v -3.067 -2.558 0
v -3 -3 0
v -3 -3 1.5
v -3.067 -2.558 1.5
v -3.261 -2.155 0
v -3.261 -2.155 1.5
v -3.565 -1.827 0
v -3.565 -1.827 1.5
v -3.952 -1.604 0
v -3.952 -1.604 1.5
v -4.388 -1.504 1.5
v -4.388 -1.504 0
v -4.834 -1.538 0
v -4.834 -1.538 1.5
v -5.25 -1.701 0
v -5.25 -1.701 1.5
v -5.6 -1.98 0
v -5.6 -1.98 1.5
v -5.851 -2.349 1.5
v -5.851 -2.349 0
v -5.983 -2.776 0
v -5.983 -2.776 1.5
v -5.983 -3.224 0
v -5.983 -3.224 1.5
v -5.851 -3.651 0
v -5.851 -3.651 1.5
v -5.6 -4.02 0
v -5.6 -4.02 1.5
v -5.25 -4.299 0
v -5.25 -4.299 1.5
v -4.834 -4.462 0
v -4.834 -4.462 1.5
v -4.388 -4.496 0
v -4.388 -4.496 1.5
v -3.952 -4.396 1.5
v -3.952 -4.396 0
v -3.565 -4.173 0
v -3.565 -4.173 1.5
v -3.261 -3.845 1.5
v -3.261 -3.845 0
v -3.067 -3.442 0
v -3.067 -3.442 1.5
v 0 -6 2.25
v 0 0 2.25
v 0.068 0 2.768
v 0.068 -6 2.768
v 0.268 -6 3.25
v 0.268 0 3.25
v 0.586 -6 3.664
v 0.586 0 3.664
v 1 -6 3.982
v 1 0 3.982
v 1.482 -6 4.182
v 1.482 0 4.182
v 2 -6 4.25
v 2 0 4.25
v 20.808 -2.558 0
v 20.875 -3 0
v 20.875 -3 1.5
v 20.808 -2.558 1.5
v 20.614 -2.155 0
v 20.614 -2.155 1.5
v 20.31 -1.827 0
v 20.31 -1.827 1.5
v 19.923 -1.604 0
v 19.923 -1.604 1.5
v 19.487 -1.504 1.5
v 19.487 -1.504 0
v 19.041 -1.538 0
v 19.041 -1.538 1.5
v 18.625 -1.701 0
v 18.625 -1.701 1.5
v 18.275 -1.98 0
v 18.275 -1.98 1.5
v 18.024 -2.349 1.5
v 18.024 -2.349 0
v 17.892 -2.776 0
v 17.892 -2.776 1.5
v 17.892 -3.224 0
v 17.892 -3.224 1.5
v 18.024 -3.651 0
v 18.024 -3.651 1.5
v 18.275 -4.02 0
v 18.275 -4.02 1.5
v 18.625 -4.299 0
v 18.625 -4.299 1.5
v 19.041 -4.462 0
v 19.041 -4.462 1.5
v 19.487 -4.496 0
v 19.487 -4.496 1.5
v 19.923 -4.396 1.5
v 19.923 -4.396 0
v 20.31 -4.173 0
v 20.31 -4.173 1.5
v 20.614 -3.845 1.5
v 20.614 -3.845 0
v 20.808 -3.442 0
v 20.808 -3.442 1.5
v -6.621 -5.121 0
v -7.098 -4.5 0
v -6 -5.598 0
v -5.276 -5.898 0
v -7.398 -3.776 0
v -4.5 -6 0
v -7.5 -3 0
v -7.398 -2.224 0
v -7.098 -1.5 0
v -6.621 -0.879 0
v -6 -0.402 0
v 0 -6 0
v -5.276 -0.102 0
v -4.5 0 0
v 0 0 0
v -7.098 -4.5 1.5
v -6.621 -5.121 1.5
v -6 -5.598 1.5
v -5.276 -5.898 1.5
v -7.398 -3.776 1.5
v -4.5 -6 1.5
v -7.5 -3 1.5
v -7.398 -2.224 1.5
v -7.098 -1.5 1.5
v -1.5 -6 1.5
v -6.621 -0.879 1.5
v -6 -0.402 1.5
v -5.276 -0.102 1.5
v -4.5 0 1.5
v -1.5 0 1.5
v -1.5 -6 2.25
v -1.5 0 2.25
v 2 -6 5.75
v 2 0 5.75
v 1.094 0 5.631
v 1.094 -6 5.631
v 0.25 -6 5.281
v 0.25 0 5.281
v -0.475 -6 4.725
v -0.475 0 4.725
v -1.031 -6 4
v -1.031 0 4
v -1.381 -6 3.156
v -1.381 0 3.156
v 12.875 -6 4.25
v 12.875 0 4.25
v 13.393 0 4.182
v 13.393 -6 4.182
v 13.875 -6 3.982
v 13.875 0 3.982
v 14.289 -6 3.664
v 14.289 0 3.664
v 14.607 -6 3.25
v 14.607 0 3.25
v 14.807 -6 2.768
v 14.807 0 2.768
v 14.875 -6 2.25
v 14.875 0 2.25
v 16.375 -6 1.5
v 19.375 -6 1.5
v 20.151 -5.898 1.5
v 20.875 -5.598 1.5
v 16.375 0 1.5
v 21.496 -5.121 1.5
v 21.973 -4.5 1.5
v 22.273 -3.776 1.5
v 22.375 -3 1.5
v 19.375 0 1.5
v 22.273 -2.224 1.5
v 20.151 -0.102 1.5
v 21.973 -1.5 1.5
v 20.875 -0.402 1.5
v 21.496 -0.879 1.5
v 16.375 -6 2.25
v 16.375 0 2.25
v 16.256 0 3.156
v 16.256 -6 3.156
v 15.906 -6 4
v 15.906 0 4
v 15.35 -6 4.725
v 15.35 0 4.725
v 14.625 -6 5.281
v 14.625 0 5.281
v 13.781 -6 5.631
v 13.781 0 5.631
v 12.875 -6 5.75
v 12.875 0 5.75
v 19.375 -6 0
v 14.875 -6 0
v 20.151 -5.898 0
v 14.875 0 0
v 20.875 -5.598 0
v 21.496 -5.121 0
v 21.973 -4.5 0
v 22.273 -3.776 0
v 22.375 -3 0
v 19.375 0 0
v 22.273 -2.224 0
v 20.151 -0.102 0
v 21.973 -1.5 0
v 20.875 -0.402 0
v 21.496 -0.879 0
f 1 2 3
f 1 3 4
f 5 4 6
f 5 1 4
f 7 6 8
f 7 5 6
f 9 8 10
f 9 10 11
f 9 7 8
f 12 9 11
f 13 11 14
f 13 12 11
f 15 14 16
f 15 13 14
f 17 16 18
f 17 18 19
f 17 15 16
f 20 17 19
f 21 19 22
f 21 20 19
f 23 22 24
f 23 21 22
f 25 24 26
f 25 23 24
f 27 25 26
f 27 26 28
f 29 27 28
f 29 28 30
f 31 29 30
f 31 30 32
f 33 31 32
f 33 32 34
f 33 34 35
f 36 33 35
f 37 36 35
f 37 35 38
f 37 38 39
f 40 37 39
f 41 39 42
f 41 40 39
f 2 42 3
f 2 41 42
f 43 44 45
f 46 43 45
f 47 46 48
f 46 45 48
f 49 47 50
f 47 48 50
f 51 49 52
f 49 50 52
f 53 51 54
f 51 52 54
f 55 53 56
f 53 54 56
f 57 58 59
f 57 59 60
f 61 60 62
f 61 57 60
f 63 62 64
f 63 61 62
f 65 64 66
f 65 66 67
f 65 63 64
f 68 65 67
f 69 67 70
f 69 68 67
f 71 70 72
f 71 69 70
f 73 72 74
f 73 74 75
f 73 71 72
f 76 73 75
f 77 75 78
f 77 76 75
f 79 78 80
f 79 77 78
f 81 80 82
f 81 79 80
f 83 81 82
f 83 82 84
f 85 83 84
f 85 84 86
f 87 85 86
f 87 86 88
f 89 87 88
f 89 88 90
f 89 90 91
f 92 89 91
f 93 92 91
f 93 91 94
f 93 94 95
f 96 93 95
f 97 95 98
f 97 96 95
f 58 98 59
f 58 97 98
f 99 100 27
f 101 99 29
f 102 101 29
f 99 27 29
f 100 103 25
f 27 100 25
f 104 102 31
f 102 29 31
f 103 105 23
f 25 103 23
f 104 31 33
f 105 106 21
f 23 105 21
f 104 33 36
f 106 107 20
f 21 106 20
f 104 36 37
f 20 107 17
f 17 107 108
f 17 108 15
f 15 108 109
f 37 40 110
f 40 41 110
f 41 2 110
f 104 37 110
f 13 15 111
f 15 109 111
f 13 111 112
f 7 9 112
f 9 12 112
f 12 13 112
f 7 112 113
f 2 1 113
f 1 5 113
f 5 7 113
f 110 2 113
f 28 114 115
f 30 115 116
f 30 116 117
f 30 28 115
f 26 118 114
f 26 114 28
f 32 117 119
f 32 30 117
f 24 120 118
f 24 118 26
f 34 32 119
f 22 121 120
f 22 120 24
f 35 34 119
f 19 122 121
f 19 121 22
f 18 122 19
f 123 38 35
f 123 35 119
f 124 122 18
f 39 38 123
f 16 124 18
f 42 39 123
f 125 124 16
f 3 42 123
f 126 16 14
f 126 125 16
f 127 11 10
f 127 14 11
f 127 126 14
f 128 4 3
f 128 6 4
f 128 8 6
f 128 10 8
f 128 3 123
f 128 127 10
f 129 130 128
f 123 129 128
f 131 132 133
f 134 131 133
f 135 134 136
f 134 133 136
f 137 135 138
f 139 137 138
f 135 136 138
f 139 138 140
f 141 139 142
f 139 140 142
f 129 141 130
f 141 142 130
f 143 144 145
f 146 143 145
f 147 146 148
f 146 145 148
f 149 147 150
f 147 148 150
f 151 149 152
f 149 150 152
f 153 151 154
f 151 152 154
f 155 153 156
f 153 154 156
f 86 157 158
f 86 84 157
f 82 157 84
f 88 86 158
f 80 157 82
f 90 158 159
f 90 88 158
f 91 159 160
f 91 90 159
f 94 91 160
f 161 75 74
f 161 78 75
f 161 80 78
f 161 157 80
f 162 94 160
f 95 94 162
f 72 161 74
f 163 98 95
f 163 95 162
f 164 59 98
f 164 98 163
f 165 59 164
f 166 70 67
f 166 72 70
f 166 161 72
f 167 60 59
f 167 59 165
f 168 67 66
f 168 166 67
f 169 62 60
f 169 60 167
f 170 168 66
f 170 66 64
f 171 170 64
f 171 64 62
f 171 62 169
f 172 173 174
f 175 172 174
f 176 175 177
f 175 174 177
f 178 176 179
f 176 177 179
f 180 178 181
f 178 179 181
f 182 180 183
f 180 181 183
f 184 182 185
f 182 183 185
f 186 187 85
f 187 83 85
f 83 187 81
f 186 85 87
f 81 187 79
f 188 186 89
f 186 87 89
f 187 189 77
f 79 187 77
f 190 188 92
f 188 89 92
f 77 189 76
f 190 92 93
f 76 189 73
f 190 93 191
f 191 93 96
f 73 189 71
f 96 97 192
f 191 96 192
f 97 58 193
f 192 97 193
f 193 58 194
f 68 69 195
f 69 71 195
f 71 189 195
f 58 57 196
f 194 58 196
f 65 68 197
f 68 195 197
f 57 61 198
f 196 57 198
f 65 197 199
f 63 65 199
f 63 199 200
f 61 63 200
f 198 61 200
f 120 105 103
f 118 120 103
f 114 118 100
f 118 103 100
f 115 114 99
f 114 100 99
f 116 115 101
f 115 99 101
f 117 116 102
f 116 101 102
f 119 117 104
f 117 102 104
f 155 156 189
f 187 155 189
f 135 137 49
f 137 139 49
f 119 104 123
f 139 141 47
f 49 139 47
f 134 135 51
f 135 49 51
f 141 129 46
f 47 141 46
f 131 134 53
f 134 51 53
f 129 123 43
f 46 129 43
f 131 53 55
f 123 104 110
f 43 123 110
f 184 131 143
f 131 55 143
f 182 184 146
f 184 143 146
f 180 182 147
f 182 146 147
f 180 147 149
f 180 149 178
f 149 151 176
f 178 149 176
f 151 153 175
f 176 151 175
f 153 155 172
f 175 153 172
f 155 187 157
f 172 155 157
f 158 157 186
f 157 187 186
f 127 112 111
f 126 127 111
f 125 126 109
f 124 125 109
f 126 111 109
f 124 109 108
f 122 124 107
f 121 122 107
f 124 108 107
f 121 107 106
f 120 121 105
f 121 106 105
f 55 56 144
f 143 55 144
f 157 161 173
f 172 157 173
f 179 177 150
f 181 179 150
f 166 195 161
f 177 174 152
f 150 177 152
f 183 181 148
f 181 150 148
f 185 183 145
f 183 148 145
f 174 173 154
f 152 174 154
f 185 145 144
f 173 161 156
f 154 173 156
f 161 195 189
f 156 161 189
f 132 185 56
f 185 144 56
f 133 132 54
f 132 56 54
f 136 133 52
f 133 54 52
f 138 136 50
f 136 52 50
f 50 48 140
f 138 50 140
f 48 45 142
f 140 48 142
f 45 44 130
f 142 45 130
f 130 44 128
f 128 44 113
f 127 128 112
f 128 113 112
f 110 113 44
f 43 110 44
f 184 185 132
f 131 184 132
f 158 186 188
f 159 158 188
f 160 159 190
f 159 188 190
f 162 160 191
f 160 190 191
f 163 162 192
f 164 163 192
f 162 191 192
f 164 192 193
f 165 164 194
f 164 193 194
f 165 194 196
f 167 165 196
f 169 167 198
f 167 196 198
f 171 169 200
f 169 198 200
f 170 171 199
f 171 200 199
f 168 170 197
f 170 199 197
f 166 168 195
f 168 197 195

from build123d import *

# Parameters (mm, degrees)
F1_DEPTH = 6
F2_R     = 1.5
F3_DEPTH = 1.5


with BuildPart() as f1:
    # F0 (on Front) → F1 (new body)
    with BuildSketch(Plane.XZ):
        with BuildLine():
            Line((-1.5, 0), (0, 0))
            Line((0, 0), (0, 2.25))
            ThreePointArc((0, 2.25), (0.585786, 3.664214), (2, 4.25))
            Line((2, 4.25), (12.875, 4.25))
            ThreePointArc((12.875, 4.25), (14.289214, 3.664214), (14.875, 2.25))
            Line((14.875, 2.25), (14.875, 0))
            Line((14.875, 0), (16.375, 0))
            Line((16.375, 0), (16.375, 2.25))
            ThreePointArc((16.375, 2.25), (15.349874, 4.724874), (12.875, 5.75))
            Line((12.875, 5.75), (2, 5.75))
            ThreePointArc((2, 5.75), (-0.474874, 4.724874), (-1.5, 2.25))
            Line((-1.5, 2.25), (-1.5, 0))
        make_face()
    extrude(amount=F1_DEPTH)

    # F2 (on Top) → F3 (join)
    with BuildSketch(Plane.XY):
        with BuildLine():
            Line((-1.5, -6), (-1.5, 0))
            Line((-1.5, 0), (-4.5, 0))
            ThreePointArc((-4.5, 0), (-6.62132, -0.87868), (-7.5, -3))
            ThreePointArc((-7.5, -3), (-6.62132, -5.12132), (-4.5, -6))
            Line((-4.5, -6), (-1.5, -6))
        make_face()
        with Locations((-4.5, -3)):
            Circle(F2_R, mode=Mode.SUBTRACT)
        with BuildLine():
            Line((16.375, 0), (16.375, -6))
            Line((16.375, -6), (19.375, -6))
            ThreePointArc((19.375, -6), (21.49632, -5.12132), (22.375, -3))
            ThreePointArc((22.375, -3), (21.49632, -0.87868), (19.375, 0))
            Line((19.375, 0), (16.375, 0))
        make_face()
        with Locations((19.375, -3)):
            Circle(F2_R, mode=Mode.SUBTRACT)
    extrude(amount=F3_DEPTH)


solid = f1.part
